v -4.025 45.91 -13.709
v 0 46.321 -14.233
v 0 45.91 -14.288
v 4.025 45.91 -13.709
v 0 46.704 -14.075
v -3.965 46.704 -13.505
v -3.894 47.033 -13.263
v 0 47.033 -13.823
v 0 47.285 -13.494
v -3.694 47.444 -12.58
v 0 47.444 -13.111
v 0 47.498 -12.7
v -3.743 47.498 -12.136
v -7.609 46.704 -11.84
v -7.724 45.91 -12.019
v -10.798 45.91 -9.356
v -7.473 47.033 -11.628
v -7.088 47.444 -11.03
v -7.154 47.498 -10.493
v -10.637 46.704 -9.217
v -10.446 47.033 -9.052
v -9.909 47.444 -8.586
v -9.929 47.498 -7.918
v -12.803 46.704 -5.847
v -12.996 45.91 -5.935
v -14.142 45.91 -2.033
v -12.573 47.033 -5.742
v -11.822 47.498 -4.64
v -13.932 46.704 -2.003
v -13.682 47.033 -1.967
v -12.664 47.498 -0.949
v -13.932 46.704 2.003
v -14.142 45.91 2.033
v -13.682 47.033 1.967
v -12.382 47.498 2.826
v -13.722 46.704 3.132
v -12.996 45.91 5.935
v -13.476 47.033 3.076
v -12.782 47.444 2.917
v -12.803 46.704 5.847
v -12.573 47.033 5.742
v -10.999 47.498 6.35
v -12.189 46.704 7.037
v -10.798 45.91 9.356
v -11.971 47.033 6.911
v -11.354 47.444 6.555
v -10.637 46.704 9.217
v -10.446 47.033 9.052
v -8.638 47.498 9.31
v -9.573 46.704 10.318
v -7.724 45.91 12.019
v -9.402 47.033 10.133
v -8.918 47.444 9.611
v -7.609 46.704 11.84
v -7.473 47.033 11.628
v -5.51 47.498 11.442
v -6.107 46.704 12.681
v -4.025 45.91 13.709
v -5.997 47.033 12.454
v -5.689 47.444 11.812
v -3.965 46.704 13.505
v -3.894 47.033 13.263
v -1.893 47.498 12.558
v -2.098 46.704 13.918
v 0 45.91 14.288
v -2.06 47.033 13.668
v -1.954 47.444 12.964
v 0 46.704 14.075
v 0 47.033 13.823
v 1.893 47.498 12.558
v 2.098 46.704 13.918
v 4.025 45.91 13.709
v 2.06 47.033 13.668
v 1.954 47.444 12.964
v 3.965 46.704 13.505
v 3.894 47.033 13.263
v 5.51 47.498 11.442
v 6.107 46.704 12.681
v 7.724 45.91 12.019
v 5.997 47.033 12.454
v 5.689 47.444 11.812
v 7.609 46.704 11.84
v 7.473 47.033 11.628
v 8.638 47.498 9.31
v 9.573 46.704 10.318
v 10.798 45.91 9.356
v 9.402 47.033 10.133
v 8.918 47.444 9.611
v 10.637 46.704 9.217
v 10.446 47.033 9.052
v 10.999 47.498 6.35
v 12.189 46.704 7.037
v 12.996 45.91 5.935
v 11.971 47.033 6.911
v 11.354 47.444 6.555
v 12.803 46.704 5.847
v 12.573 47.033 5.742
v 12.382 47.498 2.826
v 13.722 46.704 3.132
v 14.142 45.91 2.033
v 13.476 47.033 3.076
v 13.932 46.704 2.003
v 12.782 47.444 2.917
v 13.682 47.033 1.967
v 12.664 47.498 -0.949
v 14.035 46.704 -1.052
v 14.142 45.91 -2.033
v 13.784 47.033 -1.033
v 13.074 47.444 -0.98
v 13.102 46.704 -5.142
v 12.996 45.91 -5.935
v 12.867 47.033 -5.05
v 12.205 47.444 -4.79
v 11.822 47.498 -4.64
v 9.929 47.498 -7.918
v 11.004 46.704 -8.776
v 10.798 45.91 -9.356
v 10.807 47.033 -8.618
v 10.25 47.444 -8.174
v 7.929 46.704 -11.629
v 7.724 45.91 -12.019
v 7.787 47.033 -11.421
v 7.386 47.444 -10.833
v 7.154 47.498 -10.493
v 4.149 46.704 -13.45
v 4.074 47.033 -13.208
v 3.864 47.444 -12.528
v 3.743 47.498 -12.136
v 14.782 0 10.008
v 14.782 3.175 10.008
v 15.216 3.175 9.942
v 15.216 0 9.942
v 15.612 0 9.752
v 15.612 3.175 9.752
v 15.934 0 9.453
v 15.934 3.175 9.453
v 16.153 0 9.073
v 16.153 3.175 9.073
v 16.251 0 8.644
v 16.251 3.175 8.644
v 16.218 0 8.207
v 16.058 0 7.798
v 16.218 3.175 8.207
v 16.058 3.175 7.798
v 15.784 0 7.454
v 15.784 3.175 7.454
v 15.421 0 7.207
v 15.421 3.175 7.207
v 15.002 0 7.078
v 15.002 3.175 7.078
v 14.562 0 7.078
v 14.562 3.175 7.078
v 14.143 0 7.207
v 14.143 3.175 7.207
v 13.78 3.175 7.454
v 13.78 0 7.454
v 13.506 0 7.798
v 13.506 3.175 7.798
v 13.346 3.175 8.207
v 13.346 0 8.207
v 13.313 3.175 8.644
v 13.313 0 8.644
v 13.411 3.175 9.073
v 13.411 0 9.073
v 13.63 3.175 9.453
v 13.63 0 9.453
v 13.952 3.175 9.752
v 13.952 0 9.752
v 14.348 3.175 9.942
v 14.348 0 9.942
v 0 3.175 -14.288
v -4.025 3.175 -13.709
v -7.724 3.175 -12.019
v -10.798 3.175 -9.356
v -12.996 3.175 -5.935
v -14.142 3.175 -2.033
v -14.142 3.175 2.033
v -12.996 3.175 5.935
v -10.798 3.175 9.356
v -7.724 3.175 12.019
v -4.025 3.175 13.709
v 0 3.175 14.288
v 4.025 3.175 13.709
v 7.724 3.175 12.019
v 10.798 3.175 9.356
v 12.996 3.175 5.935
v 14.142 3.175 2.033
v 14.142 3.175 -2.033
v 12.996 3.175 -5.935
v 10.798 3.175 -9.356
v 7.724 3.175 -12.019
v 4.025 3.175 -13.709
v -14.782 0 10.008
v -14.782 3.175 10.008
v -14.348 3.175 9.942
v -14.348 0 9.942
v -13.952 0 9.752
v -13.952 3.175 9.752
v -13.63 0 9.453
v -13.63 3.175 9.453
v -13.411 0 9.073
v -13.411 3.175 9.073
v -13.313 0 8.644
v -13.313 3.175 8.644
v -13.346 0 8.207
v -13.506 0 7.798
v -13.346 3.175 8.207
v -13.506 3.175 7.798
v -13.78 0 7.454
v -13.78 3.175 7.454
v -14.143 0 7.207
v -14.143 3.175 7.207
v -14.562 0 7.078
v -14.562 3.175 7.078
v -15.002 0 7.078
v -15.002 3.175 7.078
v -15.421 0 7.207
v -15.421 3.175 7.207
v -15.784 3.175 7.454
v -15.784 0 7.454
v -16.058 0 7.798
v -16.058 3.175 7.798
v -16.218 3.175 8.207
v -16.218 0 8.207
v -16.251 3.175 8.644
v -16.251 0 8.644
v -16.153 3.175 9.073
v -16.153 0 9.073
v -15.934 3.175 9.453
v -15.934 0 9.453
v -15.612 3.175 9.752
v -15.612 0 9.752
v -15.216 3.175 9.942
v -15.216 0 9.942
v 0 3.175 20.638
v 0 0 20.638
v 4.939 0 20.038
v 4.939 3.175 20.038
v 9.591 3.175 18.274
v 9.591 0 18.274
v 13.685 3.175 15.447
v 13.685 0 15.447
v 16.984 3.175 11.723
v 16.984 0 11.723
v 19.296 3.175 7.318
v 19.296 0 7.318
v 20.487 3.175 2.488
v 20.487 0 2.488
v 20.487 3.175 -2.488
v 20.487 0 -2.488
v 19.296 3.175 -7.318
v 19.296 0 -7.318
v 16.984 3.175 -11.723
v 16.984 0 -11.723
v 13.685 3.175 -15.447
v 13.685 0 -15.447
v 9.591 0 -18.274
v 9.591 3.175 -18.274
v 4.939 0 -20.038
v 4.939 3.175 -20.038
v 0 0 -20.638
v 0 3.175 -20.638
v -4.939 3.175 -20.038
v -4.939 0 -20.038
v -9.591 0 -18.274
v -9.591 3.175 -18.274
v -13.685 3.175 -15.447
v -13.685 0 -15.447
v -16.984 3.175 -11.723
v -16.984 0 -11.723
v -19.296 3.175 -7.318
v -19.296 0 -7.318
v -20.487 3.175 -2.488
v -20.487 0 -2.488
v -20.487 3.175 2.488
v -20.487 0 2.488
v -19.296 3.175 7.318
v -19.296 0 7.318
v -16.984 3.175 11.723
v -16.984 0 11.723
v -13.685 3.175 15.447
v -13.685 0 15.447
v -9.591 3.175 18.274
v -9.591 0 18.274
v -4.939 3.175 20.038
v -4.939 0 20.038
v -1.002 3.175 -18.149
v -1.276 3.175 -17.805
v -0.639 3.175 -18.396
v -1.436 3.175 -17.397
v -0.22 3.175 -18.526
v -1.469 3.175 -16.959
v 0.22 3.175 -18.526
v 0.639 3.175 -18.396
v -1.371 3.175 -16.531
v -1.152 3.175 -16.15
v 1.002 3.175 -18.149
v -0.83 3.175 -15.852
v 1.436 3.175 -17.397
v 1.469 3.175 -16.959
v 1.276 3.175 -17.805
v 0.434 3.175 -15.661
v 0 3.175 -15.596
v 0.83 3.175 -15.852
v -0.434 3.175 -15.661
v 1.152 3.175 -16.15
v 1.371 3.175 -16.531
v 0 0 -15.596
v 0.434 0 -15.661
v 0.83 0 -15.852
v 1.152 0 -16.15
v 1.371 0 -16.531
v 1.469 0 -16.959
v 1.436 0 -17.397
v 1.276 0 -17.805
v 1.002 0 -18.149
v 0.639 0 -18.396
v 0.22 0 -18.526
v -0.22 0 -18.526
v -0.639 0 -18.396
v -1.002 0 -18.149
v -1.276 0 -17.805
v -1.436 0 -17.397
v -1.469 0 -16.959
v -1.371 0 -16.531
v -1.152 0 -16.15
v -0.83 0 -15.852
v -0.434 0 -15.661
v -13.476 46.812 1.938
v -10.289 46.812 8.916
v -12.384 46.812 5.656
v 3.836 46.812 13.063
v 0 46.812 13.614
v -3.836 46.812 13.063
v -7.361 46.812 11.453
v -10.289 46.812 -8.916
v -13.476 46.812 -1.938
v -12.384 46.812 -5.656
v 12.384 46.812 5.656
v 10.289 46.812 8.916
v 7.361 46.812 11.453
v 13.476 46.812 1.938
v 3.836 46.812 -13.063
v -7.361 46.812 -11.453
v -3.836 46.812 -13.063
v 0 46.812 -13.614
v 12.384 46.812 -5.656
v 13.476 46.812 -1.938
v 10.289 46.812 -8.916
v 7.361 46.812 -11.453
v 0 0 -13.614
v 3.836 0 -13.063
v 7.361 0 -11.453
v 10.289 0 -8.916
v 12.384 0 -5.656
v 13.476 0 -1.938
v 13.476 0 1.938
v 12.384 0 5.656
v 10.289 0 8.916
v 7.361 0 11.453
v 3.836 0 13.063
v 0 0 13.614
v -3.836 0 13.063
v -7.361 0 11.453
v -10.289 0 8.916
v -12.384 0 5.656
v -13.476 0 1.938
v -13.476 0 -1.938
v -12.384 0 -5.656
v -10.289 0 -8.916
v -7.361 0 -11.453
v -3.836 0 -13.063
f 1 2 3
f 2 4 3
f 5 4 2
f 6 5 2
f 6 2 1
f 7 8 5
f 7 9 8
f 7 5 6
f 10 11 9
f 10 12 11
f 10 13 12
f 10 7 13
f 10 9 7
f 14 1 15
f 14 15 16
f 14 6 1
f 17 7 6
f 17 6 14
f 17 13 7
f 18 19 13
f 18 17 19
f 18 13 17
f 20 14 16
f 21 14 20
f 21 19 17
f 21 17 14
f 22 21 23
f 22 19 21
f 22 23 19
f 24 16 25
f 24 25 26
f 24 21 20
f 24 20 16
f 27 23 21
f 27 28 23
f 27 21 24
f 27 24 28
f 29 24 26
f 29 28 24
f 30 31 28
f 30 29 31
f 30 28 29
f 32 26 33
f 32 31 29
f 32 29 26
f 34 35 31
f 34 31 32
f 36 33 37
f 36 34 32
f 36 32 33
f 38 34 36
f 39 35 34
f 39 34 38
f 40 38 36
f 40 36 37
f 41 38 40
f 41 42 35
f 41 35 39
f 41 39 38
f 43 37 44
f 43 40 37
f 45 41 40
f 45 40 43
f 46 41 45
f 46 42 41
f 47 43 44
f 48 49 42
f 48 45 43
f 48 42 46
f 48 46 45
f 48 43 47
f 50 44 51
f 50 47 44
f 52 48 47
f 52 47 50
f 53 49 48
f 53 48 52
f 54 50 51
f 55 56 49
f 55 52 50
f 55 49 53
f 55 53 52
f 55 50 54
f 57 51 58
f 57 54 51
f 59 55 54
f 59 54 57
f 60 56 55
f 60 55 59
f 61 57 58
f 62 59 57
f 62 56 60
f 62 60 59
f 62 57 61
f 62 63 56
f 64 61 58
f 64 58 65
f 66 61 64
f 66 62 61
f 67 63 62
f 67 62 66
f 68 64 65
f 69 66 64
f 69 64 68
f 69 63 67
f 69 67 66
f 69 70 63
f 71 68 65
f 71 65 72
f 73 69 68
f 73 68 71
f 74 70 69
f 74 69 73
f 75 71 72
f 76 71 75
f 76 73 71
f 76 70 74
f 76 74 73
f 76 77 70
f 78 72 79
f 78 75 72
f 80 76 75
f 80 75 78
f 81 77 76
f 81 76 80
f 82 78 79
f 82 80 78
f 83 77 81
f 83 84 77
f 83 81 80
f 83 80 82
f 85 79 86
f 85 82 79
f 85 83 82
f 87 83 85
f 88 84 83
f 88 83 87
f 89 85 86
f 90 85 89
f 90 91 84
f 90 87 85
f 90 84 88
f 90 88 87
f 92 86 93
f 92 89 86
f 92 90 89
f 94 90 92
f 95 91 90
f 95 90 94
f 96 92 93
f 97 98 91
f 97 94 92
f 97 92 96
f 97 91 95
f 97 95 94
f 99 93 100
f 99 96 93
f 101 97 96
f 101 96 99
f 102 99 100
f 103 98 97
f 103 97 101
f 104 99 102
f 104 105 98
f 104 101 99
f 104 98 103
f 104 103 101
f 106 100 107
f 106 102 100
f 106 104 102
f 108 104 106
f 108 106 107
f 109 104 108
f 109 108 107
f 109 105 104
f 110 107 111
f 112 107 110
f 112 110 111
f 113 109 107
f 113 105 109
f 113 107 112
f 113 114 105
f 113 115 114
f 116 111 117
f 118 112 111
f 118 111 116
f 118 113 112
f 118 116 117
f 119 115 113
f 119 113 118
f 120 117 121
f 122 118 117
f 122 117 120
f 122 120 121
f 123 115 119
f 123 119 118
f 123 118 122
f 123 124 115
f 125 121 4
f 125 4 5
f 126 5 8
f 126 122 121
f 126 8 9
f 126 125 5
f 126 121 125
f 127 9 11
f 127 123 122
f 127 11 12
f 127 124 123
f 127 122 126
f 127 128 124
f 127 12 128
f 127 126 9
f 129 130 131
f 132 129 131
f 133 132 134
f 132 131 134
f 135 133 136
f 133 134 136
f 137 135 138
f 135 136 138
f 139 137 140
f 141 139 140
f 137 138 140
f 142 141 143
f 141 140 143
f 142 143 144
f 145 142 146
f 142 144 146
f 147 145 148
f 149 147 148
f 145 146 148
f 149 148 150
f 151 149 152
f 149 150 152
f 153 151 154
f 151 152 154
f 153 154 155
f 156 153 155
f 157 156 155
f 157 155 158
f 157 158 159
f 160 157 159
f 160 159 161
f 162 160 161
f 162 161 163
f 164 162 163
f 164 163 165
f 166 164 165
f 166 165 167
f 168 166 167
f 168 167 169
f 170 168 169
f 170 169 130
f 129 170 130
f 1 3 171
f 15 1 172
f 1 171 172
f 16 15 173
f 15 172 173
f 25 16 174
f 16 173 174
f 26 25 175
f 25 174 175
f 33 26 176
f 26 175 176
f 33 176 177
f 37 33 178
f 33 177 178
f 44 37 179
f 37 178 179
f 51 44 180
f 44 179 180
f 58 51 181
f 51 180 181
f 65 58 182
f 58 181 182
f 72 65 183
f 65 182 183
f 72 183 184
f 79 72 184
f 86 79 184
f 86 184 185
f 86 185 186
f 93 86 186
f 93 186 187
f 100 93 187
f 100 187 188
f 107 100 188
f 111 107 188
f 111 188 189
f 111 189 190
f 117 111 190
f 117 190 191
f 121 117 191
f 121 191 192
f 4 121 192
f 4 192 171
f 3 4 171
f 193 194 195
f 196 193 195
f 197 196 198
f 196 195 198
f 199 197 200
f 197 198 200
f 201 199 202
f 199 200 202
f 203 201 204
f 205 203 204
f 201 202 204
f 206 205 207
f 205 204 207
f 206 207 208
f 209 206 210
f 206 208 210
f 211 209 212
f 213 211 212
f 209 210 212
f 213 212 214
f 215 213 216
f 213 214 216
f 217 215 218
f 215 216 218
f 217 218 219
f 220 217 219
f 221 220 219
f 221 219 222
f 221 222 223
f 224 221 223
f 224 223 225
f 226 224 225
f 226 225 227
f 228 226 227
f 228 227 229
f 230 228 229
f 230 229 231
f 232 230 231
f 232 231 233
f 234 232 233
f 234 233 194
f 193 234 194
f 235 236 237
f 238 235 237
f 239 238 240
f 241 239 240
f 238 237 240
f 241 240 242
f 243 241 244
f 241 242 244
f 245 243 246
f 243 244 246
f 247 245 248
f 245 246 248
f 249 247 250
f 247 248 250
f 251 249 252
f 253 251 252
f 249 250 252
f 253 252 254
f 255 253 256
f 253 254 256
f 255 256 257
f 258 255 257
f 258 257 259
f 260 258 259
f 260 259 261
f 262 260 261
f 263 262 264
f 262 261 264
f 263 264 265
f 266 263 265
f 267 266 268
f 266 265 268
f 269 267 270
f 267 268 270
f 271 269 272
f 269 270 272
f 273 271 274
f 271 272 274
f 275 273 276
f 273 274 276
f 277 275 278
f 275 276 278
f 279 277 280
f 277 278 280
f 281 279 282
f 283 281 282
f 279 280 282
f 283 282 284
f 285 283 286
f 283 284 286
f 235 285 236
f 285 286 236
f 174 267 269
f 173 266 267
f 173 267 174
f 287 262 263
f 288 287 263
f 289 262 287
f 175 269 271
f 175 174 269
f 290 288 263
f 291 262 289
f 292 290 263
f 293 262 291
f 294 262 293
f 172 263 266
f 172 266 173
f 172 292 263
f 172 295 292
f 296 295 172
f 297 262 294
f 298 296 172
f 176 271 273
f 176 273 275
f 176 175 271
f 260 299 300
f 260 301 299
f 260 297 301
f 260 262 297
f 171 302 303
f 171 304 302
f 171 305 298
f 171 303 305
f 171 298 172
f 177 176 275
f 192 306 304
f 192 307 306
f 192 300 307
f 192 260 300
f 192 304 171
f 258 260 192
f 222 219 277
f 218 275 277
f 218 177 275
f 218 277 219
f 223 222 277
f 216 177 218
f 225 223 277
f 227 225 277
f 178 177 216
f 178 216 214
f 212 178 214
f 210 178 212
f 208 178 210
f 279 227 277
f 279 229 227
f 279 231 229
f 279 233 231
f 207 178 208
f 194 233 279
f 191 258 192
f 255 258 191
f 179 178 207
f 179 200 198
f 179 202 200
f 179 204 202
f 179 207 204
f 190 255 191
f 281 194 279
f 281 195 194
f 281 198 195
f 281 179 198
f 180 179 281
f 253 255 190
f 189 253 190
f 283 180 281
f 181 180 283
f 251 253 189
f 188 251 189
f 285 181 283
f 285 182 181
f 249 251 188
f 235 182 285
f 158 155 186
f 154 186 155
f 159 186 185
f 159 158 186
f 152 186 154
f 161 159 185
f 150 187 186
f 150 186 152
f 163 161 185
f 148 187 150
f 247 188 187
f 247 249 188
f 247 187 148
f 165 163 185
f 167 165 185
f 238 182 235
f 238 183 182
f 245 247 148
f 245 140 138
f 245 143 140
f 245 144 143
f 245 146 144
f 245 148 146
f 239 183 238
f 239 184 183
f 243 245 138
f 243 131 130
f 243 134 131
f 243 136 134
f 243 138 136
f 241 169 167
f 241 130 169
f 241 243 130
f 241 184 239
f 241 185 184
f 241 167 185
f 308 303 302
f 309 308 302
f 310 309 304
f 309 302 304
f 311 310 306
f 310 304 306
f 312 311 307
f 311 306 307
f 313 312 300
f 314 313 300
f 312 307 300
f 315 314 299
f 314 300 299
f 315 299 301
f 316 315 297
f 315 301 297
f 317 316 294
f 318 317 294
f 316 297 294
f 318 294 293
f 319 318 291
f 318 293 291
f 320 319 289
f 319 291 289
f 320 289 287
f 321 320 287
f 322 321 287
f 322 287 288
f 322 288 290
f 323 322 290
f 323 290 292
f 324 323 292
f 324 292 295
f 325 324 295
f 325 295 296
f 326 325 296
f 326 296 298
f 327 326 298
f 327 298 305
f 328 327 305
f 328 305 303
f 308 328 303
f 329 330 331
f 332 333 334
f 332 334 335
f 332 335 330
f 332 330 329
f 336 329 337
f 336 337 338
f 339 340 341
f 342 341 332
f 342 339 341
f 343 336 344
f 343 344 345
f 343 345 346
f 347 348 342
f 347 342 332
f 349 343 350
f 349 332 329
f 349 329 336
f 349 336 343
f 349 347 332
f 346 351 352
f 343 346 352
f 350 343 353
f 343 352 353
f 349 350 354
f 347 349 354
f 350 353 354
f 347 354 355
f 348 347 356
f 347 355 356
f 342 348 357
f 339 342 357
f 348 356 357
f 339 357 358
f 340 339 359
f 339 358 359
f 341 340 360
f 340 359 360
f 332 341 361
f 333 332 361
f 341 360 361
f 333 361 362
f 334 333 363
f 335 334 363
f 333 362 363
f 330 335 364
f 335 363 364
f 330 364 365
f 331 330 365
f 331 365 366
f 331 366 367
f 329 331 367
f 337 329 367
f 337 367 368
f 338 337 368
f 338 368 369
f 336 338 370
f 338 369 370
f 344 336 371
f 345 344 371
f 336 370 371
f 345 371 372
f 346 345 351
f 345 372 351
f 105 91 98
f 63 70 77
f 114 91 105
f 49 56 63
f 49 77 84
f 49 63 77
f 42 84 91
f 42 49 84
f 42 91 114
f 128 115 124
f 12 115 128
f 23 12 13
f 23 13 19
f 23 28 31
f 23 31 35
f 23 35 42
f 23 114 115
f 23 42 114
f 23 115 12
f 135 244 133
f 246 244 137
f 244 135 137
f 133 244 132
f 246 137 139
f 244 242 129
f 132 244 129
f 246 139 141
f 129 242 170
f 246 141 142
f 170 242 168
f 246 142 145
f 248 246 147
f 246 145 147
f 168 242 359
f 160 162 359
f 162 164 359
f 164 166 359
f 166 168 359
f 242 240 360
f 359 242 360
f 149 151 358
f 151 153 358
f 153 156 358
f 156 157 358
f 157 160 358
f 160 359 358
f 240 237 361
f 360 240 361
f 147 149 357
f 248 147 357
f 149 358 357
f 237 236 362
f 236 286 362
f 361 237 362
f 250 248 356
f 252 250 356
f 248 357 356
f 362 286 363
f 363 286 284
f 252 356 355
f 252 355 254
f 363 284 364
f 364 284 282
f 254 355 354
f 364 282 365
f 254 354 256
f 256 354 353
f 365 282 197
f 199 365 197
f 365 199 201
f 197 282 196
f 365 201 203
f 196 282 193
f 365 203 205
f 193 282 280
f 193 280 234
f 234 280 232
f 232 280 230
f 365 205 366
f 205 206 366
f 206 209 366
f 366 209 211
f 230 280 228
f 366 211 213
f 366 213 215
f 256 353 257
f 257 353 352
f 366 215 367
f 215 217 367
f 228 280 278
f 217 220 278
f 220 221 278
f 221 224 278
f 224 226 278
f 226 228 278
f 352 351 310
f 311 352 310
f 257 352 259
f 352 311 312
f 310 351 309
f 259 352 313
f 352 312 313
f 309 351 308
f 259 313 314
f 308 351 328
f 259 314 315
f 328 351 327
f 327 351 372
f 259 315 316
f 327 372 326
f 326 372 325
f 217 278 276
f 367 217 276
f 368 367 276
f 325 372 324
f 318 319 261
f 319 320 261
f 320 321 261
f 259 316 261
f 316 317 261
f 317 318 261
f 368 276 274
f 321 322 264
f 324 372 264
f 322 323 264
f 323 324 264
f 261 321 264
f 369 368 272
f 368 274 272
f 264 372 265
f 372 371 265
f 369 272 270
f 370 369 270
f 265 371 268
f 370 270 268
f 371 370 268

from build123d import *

# Parameters (mm, degrees)
SKETCH1_R           = 20.6375
BOSS_EXTRUDE1_DEPTH = 3.175
BOSS_EXTRUDE2_START = -3.175
SKETCH2_R           = 14.2875
BOSS_EXTRUDE2_DEPTH = 47.498
SKETCH3_R           = 1.4732
CUT_EXTRUDE1_DEPTH  = 54.069210862
SKETCH4_R           = 13.6144
CUT_EXTRUDE2_DEPTH  = 46.8122
FILLET1_R           = 1.5875


with BuildPart() as part:
    # Sketch1 → Boss-Extrude1 (new body)
    with BuildSketch(Plane(origin=(0, 0, 0), x_dir=(1, 0, 0), z_dir=(0, 1, 0))):
        with Locations(Location((0, 0, 0), (0, 0, 270))):
            Circle(SKETCH1_R)
    extrude(amount=BOSS_EXTRUDE1_DEPTH)

    # Sketch2 → Boss-Extrude2 (add)
    with BuildSketch(Plane(origin=(0, 3.175, 0), x_dir=(1, 0, 0), z_dir=(0, 1, 0)).offset(BOSS_EXTRUDE2_START)):
        with Locations(Location((0, 0, 0), (0, 0, 90))):
            Circle(SKETCH2_R)
    extrude(amount=BOSS_EXTRUDE2_DEPTH)

    # Sketch3 → Cut-Extrude1 (cut, through all)
    with BuildSketch(Plane(origin=(0, 3.175, 0), x_dir=(1, 0, 0), z_dir=(0, 1, 0))):
        with Locations(Location((0, 17.0688, 0), (0, 0, 270))):
            Circle(SKETCH3_R)
        with Locations(Location((14.782014412, -8.5344, 0), (0, 0, 270))):
            Circle(SKETCH3_R)
        with Locations(Location((-14.782014412, -8.5344, 0), (0, 0, 270))):
            Circle(SKETCH3_R)
    extrude(amount=-CUT_EXTRUDE1_DEPTH, mode=Mode.SUBTRACT)

    # Sketch4 → Cut-Extrude2 (cut)
    with BuildSketch(Plane.XZ):
        with Locations(Location((0, 0, 0), (0, 0, 270))):
            Circle(SKETCH4_R)
    extrude(amount=-CUT_EXTRUDE2_DEPTH, mode=Mode.SUBTRACT)

    # Fillet1
    fillet1_edges = [part.edges().sort_by_distance(p)[0] for p in [
        (0, 47.498, 14.2875),
    ]]
    fillet(fillet1_edges, radius=FILLET1_R)


solid = part.part
